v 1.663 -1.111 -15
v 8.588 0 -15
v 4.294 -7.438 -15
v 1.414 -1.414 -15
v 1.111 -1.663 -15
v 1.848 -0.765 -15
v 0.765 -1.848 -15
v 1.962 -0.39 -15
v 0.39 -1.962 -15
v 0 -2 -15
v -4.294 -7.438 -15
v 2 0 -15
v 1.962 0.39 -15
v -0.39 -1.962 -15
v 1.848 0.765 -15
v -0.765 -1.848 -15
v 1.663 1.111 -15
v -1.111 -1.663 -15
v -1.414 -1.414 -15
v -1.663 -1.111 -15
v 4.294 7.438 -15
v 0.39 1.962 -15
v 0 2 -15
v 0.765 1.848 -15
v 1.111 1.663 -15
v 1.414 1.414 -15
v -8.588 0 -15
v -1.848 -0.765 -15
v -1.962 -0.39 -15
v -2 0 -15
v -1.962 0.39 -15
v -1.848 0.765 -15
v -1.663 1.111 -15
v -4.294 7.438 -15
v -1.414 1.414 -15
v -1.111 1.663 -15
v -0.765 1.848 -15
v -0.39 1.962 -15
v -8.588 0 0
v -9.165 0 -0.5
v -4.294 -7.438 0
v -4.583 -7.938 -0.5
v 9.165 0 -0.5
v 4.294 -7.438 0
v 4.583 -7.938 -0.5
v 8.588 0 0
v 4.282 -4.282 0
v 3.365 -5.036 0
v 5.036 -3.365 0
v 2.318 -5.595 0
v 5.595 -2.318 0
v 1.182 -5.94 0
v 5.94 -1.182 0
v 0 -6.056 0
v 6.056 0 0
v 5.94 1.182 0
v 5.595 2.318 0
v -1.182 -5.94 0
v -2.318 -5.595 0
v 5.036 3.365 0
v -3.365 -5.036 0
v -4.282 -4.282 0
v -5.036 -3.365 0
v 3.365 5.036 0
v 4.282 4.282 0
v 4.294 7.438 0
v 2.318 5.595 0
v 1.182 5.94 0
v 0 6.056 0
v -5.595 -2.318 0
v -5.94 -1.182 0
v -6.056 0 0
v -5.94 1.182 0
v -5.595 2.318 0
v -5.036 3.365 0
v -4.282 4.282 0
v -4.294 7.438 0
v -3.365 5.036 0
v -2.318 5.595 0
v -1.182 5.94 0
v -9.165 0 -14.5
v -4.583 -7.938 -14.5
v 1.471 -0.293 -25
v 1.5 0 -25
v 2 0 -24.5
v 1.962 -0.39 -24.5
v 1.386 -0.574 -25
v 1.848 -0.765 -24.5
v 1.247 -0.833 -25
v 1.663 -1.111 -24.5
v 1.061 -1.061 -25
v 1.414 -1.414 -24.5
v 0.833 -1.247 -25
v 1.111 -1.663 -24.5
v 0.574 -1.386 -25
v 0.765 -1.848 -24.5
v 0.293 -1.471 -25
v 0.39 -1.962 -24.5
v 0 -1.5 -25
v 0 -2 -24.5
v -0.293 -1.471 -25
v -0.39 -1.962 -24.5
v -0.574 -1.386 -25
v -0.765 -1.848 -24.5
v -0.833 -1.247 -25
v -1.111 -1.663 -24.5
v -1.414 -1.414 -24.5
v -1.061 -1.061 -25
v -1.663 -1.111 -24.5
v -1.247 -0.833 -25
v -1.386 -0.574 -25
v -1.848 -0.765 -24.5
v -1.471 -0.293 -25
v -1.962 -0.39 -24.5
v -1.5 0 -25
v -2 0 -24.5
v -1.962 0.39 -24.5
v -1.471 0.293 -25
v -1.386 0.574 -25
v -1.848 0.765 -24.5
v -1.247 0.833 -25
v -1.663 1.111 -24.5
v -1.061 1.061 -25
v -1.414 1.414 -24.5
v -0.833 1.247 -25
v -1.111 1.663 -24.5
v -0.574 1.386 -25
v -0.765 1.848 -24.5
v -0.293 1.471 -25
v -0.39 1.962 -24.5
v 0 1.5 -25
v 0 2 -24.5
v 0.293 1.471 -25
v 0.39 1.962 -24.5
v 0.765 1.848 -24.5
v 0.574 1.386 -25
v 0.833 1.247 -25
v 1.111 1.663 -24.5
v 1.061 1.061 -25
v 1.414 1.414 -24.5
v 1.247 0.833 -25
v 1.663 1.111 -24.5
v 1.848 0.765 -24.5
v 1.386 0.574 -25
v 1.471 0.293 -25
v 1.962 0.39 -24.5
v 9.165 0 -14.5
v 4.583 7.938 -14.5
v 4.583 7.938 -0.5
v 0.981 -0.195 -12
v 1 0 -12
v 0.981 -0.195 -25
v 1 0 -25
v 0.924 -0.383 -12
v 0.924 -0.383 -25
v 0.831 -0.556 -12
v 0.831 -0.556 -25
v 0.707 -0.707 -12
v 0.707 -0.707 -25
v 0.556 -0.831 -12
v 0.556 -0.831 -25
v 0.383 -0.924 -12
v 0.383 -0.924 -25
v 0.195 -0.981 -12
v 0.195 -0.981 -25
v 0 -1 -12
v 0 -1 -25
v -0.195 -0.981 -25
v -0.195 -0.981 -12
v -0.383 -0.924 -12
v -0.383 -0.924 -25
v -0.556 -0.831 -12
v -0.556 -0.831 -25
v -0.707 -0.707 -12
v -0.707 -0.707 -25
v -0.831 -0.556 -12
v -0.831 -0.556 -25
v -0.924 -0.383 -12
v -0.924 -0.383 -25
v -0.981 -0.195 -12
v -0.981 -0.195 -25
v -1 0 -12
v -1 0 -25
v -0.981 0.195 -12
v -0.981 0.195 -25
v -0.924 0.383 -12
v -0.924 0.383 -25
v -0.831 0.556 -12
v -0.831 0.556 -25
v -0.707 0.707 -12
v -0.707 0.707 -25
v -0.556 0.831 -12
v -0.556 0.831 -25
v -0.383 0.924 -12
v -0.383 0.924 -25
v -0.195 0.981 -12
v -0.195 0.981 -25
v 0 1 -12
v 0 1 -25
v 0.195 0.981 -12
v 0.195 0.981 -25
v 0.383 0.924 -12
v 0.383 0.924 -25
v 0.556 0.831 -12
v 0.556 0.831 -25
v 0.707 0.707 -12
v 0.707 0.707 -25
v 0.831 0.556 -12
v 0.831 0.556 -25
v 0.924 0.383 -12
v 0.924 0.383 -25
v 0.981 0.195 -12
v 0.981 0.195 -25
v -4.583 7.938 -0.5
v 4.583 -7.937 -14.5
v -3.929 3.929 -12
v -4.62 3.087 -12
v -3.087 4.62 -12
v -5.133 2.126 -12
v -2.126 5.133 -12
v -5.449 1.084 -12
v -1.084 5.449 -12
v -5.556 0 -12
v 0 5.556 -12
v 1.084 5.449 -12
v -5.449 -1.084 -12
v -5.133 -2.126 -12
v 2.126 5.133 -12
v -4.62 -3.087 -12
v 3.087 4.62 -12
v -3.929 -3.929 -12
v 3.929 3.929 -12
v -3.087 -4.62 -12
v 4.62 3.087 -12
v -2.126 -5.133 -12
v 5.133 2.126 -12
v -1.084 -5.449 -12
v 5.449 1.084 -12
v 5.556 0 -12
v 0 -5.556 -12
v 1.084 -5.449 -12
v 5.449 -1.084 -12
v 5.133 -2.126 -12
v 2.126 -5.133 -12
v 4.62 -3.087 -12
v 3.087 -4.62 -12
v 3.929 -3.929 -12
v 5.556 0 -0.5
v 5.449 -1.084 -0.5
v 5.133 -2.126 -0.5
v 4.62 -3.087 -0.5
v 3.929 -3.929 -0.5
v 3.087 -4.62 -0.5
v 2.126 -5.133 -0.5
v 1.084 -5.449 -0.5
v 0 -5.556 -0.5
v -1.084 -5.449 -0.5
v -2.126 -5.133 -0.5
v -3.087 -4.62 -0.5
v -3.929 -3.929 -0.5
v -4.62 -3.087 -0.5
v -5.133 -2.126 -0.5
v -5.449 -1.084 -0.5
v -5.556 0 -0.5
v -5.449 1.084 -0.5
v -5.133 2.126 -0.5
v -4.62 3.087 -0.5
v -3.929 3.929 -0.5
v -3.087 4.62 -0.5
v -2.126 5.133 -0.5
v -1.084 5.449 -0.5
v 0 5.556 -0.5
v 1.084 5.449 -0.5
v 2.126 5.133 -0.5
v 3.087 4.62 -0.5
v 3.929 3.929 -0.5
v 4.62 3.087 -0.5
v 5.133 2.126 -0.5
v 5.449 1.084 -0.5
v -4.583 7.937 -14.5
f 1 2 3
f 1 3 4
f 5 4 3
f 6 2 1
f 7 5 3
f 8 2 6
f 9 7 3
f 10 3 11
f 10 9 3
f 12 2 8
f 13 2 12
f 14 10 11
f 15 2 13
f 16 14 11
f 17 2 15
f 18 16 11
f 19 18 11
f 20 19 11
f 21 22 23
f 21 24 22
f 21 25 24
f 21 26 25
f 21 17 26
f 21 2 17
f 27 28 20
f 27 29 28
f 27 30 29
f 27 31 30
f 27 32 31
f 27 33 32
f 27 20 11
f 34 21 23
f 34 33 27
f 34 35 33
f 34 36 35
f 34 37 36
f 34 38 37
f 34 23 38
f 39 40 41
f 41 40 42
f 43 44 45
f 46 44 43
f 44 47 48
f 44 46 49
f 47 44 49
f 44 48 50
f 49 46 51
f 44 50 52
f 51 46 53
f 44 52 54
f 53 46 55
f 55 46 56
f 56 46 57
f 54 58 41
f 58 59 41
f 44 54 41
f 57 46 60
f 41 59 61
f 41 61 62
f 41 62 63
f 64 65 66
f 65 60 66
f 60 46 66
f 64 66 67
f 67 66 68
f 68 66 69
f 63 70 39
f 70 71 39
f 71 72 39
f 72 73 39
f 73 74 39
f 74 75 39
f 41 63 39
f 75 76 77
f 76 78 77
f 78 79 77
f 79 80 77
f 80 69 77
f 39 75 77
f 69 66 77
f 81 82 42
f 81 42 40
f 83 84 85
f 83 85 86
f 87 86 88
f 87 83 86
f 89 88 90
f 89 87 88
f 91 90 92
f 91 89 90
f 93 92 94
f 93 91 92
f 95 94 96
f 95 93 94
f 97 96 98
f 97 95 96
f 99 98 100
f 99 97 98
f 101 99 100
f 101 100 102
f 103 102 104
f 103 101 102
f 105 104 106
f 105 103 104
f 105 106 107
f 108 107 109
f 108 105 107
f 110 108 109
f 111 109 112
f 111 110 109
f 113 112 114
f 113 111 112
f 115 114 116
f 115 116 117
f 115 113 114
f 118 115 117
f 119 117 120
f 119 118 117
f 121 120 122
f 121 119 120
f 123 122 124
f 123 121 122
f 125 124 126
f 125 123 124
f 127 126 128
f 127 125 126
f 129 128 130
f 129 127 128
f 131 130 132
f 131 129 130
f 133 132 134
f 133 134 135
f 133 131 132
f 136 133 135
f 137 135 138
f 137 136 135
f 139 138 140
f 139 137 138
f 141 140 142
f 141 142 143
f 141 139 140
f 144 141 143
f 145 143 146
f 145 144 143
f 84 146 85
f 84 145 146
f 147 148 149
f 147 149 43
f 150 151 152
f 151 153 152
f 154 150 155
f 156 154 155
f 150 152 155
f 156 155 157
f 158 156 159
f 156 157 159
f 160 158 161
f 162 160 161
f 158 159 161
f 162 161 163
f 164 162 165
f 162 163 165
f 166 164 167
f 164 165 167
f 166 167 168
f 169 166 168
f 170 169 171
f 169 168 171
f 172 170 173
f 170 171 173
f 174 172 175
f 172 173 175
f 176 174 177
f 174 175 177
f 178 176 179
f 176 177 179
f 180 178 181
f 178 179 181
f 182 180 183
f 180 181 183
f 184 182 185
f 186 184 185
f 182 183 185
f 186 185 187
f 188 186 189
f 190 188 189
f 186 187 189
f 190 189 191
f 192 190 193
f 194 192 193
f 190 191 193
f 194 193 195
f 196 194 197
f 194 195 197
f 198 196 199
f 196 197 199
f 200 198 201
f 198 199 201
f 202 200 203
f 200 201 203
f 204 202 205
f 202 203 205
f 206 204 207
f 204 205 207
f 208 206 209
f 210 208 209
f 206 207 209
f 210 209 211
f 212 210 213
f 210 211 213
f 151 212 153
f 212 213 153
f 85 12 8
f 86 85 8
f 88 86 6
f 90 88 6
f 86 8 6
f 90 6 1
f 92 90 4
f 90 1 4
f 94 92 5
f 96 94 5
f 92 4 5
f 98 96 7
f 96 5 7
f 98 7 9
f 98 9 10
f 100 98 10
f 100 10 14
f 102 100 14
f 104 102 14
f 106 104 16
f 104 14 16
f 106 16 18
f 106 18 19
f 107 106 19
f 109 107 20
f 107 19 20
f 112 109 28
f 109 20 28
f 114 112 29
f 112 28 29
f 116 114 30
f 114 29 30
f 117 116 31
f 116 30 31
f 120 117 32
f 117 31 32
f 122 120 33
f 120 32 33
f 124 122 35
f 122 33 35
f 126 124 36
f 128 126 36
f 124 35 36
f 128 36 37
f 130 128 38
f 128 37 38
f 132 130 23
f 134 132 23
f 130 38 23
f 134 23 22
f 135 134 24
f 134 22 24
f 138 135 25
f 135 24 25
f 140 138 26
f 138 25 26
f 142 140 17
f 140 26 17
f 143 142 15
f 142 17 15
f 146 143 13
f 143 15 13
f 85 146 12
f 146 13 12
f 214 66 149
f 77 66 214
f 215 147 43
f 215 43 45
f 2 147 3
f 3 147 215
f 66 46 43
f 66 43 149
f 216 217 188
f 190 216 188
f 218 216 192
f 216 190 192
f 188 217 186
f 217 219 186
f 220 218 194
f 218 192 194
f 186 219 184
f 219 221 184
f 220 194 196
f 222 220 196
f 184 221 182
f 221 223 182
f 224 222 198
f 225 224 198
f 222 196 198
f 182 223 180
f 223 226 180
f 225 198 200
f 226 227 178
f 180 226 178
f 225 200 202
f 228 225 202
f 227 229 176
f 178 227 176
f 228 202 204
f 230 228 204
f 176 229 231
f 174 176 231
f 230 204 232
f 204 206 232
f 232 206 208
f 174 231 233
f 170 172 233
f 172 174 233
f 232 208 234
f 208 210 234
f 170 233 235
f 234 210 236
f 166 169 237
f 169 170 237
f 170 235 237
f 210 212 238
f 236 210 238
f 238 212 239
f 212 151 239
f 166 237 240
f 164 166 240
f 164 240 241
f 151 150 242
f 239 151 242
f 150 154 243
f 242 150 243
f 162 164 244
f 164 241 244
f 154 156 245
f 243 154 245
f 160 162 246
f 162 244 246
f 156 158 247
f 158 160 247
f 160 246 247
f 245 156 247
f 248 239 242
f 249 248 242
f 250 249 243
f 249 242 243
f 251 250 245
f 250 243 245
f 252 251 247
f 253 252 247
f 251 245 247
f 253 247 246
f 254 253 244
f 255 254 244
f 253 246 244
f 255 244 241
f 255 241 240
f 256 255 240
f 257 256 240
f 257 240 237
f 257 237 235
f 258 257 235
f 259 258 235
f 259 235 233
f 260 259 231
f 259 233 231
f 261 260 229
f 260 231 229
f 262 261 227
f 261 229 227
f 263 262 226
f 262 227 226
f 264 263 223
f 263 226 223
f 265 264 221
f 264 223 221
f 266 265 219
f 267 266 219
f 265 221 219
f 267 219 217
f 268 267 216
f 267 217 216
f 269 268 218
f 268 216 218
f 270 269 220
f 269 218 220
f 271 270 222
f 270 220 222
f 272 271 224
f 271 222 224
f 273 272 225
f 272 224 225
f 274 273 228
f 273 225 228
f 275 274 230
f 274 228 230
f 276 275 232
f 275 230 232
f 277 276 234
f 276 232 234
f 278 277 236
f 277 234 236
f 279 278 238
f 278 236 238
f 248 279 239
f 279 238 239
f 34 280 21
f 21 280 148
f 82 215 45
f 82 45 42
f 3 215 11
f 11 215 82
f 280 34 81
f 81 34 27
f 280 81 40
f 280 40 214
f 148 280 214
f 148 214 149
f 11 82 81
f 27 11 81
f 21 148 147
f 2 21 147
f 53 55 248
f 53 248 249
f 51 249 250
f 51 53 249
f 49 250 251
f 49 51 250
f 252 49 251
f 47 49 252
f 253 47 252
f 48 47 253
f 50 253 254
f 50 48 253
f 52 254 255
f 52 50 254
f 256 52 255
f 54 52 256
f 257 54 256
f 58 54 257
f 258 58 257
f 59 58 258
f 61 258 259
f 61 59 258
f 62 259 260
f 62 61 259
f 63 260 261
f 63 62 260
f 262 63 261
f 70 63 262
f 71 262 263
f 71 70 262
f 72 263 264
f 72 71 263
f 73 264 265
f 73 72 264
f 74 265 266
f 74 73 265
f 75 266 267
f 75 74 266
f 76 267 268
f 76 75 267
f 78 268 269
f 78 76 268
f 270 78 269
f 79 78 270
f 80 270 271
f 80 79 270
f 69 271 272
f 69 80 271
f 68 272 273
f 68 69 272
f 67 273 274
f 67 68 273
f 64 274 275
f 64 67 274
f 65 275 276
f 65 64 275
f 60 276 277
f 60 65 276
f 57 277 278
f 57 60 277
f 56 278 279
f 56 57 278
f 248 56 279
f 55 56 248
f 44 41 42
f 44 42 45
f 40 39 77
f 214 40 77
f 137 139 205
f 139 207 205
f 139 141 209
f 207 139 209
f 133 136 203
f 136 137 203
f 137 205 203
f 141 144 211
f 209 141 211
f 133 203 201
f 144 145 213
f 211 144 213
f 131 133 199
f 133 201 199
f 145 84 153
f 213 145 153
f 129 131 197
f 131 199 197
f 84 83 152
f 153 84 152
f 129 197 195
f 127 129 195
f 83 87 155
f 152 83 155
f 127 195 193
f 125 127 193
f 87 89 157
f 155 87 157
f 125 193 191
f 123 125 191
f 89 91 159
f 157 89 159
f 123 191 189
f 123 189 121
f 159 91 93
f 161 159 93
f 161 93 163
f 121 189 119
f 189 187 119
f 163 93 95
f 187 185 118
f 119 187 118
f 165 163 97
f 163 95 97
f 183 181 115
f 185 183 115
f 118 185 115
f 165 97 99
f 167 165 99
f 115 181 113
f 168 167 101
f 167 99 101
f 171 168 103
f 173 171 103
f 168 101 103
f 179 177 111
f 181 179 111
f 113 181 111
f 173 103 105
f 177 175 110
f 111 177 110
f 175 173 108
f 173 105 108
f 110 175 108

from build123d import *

# Parameters (mm, degrees)
SKETCH2_R           = 5.55625
BOSS_EXTRUDE1_DEPTH = 15
CHAMFER1_SIZE       = 0.5


with BuildPart() as part:
    # Sketch1 → Revolve1 (revolve)
    with BuildSketch(Plane(origin=(0, 0, 0), x_dir=(1, 0, 0), z_dir=(0, 1, 0))):
        Polygon((1, 25), (2, 25), (2, 15), (7.9375, 15), (7.9375, 0), (5.55625, 0), (5.55625, 12), (1, 12), align=None)
    revolve(axis=Axis((0, 0, 0), (0, 0, -1)))

    # Sketch2 → Boss-Extrude1 (add, through all)
    with BuildSketch(Plane(origin=(0, 0, -15), x_dir=(-1, 0, 0), z_dir=(0, 0, -1))):
        Polygon((9.165435523, 0), (4.582717762, 7.9375), (-4.582717762, 7.9375), (-9.165435523, 0), (-4.582717762, -7.9375), (4.582717762, -7.9375), align=None)
        with Locations(Location((0, 0, 0), (0, 0, 180))):
            Circle(SKETCH2_R, mode=Mode.SUBTRACT)
    extrude(amount=-BOSS_EXTRUDE1_DEPTH)

    # Chamfer1
    chamfer1_edges = [part.edges().sort_by_distance(p)[0] for p in [
        (-6.874076643, -3.96875, -15),
        (0, -7.9375, -15),
        (6.874076643, -3.96875, -15),
        (6.874076643, 3.96875, -15),
        (0, 7.9375, -15),
        (-6.874076643, 3.96875, -15),
        (-6.874076643, -3.96875, 0),
        (0, -7.9375, 0),
        (6.874076643, -3.96875, 0),
        (6.874076643, 3.96875, 0),
        (0, 7.9375, 0),
        (-6.874076643, 3.96875, 0),
        (-5.55625, 0, 0),
        (-2, 0, -25),
    ]]
    chamfer(chamfer1_edges, length=CHAMFER1_SIZE)


solid = part.part
